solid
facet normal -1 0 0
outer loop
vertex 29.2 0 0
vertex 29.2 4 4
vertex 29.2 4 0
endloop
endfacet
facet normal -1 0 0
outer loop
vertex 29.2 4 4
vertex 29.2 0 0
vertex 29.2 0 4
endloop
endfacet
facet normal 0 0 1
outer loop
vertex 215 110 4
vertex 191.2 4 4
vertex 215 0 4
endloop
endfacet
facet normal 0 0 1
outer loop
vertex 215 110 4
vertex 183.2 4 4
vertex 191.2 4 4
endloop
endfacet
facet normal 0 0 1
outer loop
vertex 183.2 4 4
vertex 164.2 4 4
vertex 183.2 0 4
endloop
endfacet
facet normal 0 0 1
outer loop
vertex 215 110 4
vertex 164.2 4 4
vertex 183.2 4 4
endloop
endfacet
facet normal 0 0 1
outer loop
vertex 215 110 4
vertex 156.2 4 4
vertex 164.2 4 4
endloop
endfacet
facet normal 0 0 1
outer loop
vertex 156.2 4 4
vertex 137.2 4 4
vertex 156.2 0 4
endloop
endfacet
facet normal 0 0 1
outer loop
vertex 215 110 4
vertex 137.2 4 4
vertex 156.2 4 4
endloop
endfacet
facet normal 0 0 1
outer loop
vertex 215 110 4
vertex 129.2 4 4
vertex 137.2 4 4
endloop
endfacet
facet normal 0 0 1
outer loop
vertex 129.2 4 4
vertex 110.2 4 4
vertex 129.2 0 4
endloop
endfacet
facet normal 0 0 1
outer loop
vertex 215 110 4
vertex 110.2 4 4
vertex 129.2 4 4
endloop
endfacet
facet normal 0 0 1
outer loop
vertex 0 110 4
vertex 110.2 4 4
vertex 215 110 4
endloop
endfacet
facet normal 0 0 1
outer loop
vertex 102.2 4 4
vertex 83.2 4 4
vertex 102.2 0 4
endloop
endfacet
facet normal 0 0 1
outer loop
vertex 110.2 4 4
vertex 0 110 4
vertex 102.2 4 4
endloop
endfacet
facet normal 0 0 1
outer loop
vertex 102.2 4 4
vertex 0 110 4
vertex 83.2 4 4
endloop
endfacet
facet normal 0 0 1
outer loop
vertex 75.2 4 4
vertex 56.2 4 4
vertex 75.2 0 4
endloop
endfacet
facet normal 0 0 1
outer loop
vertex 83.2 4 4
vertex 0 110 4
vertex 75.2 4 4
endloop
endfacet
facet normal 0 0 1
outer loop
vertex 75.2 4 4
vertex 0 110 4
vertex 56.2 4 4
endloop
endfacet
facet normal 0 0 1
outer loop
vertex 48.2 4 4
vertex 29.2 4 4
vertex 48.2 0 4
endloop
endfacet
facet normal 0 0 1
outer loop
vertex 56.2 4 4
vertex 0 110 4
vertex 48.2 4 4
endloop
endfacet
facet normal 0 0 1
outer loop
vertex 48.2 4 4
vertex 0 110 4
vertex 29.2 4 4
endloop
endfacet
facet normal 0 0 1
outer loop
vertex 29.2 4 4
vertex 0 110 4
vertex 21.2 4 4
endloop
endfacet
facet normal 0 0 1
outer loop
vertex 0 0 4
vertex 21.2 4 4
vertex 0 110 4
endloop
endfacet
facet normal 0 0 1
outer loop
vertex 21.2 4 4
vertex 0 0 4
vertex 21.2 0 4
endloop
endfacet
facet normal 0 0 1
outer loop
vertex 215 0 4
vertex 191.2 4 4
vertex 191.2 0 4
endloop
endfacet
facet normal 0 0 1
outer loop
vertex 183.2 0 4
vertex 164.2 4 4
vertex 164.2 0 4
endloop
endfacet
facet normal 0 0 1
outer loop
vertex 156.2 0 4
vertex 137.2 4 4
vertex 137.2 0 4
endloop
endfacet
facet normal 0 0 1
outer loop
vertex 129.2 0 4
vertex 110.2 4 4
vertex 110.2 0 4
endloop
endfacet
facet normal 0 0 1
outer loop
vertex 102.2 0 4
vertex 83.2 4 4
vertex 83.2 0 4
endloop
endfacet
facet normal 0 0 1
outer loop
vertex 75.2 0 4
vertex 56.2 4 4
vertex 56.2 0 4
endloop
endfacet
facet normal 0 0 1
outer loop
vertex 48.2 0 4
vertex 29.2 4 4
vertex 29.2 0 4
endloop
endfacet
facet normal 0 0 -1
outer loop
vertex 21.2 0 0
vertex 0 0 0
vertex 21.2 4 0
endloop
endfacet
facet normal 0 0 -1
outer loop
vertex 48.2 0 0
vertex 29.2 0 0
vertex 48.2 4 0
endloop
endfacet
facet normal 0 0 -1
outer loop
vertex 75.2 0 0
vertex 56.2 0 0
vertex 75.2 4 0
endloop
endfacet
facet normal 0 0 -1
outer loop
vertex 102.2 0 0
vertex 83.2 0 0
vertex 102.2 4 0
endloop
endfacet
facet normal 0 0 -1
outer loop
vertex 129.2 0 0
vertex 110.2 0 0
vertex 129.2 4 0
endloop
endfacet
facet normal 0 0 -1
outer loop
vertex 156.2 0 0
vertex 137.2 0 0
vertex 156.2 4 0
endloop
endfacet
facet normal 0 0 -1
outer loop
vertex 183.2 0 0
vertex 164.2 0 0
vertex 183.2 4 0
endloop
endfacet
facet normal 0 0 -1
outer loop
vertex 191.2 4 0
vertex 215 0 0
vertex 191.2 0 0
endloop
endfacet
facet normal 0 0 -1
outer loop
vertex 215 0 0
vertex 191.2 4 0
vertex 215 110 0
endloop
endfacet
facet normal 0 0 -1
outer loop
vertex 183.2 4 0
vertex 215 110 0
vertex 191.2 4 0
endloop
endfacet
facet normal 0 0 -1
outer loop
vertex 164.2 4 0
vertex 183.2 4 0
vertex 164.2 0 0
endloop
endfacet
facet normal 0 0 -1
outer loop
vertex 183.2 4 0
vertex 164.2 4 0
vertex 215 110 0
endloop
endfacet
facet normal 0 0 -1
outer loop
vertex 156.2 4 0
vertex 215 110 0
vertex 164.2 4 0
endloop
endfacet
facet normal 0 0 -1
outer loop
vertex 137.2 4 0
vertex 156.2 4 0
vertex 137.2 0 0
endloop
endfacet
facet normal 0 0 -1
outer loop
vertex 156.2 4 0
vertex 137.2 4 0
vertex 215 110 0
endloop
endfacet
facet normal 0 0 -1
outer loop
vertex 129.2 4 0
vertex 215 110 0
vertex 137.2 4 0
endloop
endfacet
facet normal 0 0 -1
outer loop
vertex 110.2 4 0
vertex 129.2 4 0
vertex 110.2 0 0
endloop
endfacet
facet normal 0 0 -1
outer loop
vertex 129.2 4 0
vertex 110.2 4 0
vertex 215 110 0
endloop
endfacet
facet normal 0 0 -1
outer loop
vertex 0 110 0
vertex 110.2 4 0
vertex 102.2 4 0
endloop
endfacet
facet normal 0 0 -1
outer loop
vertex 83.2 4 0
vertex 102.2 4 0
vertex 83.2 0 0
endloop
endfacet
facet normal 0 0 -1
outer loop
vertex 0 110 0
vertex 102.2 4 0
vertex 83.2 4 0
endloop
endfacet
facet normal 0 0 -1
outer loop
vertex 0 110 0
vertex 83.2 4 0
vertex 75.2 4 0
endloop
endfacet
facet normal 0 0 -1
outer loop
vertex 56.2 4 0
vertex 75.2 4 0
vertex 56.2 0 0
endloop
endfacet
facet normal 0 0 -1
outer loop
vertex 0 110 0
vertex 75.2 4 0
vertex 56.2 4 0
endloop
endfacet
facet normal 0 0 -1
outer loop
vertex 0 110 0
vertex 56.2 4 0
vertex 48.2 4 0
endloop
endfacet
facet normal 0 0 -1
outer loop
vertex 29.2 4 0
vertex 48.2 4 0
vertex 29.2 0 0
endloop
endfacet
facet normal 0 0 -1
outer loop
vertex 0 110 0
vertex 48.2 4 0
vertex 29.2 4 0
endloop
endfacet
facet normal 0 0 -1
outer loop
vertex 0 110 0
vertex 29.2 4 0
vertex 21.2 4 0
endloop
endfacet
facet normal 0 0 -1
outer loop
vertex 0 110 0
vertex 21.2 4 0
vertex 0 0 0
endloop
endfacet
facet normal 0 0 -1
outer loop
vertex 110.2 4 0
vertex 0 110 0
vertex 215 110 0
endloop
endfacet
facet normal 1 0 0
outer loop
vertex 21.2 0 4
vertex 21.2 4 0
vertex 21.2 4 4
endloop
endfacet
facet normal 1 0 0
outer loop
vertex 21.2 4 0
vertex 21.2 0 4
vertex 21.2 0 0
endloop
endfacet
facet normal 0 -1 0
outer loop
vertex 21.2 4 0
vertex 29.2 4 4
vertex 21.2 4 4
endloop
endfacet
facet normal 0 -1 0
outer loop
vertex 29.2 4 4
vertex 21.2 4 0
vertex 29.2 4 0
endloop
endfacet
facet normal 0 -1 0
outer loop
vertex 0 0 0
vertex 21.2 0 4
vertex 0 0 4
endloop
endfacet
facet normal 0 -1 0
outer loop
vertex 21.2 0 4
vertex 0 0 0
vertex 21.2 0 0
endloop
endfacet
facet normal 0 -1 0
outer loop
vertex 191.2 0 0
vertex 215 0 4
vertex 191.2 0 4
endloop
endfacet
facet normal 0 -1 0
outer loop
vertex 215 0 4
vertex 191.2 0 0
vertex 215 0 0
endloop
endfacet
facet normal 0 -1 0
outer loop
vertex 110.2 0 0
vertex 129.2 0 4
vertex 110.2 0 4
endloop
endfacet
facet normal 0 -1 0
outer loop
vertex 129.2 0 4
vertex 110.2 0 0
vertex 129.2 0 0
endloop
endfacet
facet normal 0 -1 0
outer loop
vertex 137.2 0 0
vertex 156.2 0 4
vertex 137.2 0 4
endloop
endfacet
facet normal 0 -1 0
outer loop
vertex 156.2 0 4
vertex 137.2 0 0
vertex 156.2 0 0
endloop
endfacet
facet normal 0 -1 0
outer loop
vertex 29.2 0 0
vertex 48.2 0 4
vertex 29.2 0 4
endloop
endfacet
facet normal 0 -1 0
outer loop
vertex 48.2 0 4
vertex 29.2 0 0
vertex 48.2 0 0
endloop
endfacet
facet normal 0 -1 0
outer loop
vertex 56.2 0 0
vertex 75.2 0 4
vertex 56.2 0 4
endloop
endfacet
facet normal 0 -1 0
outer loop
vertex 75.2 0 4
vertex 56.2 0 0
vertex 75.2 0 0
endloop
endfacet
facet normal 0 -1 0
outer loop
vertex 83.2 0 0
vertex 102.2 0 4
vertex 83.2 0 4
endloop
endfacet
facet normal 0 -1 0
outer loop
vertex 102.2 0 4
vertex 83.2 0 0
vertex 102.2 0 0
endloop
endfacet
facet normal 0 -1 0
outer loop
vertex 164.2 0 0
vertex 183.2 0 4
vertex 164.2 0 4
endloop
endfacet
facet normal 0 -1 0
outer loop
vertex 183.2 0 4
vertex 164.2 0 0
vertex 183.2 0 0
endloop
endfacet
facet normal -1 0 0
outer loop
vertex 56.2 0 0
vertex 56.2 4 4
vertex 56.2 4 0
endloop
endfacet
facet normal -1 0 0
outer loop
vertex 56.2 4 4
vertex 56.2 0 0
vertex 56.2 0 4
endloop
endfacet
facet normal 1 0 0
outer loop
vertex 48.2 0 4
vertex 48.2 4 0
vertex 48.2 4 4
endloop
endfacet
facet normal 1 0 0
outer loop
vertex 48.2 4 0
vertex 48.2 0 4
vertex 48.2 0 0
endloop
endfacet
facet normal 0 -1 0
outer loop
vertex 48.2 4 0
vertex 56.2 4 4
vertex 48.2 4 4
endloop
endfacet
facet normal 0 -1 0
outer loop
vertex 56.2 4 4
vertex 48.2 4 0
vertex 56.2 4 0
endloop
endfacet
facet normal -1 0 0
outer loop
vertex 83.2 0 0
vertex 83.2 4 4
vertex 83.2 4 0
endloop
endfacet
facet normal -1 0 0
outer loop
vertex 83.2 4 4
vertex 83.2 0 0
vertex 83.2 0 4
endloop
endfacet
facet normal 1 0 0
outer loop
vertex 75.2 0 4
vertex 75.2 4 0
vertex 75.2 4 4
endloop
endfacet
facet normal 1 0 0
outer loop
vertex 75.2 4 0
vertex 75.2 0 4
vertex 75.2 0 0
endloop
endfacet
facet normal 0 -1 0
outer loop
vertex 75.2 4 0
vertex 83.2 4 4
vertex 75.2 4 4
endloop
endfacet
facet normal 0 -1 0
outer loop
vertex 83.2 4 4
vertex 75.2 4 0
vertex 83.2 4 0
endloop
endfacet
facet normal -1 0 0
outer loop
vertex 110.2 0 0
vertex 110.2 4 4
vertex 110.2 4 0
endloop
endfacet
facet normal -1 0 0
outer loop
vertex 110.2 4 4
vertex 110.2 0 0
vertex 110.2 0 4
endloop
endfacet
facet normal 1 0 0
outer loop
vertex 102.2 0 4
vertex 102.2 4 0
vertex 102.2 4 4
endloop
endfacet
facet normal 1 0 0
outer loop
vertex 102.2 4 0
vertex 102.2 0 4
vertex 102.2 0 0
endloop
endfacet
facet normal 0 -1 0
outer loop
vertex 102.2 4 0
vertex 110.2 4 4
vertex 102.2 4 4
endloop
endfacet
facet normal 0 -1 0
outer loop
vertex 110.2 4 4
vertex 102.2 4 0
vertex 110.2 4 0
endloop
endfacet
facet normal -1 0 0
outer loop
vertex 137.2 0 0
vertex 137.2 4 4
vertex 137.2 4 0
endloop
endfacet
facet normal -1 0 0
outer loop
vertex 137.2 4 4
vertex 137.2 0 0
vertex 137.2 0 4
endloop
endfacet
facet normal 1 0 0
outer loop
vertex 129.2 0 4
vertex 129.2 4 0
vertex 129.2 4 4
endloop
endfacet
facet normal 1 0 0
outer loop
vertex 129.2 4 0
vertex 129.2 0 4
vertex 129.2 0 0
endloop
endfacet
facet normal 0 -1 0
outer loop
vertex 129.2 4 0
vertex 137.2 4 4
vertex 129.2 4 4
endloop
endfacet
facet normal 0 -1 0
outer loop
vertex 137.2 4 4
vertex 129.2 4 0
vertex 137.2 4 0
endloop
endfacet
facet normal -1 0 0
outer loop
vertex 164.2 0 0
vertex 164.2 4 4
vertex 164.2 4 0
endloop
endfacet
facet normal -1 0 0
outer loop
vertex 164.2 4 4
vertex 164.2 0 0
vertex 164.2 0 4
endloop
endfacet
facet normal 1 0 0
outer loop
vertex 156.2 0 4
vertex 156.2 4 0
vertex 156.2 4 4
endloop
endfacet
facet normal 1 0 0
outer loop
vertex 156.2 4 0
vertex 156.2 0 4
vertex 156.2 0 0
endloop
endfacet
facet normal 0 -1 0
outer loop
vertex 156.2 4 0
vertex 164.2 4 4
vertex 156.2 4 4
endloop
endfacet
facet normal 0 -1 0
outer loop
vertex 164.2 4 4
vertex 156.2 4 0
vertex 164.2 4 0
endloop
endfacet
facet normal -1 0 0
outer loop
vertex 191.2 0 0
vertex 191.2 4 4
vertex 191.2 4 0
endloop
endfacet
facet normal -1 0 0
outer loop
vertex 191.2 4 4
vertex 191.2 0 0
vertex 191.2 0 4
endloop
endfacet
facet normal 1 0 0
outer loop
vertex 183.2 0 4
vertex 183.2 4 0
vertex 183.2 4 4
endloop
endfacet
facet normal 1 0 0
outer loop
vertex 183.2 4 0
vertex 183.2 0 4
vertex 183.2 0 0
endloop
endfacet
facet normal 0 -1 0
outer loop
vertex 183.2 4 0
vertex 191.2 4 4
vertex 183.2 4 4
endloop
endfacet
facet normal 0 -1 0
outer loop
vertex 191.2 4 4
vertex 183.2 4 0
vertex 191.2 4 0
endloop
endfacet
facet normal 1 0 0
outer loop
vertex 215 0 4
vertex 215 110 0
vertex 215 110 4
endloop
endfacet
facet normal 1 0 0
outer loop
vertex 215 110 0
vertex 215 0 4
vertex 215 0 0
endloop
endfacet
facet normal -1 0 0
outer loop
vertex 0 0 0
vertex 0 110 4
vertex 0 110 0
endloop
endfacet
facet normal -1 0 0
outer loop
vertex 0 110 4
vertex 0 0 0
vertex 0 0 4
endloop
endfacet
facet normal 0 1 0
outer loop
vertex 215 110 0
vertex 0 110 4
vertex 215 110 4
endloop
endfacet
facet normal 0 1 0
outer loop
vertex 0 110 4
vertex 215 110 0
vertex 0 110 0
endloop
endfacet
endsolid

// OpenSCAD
difference() {
    cube([215, 110, 4]);
    
    // Repeating notches along the front edge (Y=0)
    for (x = [21.2 : 27 : 215 - 27]) {
        translate([x, 0, 0])
            cube([8, 4, 4]);
    }
}
